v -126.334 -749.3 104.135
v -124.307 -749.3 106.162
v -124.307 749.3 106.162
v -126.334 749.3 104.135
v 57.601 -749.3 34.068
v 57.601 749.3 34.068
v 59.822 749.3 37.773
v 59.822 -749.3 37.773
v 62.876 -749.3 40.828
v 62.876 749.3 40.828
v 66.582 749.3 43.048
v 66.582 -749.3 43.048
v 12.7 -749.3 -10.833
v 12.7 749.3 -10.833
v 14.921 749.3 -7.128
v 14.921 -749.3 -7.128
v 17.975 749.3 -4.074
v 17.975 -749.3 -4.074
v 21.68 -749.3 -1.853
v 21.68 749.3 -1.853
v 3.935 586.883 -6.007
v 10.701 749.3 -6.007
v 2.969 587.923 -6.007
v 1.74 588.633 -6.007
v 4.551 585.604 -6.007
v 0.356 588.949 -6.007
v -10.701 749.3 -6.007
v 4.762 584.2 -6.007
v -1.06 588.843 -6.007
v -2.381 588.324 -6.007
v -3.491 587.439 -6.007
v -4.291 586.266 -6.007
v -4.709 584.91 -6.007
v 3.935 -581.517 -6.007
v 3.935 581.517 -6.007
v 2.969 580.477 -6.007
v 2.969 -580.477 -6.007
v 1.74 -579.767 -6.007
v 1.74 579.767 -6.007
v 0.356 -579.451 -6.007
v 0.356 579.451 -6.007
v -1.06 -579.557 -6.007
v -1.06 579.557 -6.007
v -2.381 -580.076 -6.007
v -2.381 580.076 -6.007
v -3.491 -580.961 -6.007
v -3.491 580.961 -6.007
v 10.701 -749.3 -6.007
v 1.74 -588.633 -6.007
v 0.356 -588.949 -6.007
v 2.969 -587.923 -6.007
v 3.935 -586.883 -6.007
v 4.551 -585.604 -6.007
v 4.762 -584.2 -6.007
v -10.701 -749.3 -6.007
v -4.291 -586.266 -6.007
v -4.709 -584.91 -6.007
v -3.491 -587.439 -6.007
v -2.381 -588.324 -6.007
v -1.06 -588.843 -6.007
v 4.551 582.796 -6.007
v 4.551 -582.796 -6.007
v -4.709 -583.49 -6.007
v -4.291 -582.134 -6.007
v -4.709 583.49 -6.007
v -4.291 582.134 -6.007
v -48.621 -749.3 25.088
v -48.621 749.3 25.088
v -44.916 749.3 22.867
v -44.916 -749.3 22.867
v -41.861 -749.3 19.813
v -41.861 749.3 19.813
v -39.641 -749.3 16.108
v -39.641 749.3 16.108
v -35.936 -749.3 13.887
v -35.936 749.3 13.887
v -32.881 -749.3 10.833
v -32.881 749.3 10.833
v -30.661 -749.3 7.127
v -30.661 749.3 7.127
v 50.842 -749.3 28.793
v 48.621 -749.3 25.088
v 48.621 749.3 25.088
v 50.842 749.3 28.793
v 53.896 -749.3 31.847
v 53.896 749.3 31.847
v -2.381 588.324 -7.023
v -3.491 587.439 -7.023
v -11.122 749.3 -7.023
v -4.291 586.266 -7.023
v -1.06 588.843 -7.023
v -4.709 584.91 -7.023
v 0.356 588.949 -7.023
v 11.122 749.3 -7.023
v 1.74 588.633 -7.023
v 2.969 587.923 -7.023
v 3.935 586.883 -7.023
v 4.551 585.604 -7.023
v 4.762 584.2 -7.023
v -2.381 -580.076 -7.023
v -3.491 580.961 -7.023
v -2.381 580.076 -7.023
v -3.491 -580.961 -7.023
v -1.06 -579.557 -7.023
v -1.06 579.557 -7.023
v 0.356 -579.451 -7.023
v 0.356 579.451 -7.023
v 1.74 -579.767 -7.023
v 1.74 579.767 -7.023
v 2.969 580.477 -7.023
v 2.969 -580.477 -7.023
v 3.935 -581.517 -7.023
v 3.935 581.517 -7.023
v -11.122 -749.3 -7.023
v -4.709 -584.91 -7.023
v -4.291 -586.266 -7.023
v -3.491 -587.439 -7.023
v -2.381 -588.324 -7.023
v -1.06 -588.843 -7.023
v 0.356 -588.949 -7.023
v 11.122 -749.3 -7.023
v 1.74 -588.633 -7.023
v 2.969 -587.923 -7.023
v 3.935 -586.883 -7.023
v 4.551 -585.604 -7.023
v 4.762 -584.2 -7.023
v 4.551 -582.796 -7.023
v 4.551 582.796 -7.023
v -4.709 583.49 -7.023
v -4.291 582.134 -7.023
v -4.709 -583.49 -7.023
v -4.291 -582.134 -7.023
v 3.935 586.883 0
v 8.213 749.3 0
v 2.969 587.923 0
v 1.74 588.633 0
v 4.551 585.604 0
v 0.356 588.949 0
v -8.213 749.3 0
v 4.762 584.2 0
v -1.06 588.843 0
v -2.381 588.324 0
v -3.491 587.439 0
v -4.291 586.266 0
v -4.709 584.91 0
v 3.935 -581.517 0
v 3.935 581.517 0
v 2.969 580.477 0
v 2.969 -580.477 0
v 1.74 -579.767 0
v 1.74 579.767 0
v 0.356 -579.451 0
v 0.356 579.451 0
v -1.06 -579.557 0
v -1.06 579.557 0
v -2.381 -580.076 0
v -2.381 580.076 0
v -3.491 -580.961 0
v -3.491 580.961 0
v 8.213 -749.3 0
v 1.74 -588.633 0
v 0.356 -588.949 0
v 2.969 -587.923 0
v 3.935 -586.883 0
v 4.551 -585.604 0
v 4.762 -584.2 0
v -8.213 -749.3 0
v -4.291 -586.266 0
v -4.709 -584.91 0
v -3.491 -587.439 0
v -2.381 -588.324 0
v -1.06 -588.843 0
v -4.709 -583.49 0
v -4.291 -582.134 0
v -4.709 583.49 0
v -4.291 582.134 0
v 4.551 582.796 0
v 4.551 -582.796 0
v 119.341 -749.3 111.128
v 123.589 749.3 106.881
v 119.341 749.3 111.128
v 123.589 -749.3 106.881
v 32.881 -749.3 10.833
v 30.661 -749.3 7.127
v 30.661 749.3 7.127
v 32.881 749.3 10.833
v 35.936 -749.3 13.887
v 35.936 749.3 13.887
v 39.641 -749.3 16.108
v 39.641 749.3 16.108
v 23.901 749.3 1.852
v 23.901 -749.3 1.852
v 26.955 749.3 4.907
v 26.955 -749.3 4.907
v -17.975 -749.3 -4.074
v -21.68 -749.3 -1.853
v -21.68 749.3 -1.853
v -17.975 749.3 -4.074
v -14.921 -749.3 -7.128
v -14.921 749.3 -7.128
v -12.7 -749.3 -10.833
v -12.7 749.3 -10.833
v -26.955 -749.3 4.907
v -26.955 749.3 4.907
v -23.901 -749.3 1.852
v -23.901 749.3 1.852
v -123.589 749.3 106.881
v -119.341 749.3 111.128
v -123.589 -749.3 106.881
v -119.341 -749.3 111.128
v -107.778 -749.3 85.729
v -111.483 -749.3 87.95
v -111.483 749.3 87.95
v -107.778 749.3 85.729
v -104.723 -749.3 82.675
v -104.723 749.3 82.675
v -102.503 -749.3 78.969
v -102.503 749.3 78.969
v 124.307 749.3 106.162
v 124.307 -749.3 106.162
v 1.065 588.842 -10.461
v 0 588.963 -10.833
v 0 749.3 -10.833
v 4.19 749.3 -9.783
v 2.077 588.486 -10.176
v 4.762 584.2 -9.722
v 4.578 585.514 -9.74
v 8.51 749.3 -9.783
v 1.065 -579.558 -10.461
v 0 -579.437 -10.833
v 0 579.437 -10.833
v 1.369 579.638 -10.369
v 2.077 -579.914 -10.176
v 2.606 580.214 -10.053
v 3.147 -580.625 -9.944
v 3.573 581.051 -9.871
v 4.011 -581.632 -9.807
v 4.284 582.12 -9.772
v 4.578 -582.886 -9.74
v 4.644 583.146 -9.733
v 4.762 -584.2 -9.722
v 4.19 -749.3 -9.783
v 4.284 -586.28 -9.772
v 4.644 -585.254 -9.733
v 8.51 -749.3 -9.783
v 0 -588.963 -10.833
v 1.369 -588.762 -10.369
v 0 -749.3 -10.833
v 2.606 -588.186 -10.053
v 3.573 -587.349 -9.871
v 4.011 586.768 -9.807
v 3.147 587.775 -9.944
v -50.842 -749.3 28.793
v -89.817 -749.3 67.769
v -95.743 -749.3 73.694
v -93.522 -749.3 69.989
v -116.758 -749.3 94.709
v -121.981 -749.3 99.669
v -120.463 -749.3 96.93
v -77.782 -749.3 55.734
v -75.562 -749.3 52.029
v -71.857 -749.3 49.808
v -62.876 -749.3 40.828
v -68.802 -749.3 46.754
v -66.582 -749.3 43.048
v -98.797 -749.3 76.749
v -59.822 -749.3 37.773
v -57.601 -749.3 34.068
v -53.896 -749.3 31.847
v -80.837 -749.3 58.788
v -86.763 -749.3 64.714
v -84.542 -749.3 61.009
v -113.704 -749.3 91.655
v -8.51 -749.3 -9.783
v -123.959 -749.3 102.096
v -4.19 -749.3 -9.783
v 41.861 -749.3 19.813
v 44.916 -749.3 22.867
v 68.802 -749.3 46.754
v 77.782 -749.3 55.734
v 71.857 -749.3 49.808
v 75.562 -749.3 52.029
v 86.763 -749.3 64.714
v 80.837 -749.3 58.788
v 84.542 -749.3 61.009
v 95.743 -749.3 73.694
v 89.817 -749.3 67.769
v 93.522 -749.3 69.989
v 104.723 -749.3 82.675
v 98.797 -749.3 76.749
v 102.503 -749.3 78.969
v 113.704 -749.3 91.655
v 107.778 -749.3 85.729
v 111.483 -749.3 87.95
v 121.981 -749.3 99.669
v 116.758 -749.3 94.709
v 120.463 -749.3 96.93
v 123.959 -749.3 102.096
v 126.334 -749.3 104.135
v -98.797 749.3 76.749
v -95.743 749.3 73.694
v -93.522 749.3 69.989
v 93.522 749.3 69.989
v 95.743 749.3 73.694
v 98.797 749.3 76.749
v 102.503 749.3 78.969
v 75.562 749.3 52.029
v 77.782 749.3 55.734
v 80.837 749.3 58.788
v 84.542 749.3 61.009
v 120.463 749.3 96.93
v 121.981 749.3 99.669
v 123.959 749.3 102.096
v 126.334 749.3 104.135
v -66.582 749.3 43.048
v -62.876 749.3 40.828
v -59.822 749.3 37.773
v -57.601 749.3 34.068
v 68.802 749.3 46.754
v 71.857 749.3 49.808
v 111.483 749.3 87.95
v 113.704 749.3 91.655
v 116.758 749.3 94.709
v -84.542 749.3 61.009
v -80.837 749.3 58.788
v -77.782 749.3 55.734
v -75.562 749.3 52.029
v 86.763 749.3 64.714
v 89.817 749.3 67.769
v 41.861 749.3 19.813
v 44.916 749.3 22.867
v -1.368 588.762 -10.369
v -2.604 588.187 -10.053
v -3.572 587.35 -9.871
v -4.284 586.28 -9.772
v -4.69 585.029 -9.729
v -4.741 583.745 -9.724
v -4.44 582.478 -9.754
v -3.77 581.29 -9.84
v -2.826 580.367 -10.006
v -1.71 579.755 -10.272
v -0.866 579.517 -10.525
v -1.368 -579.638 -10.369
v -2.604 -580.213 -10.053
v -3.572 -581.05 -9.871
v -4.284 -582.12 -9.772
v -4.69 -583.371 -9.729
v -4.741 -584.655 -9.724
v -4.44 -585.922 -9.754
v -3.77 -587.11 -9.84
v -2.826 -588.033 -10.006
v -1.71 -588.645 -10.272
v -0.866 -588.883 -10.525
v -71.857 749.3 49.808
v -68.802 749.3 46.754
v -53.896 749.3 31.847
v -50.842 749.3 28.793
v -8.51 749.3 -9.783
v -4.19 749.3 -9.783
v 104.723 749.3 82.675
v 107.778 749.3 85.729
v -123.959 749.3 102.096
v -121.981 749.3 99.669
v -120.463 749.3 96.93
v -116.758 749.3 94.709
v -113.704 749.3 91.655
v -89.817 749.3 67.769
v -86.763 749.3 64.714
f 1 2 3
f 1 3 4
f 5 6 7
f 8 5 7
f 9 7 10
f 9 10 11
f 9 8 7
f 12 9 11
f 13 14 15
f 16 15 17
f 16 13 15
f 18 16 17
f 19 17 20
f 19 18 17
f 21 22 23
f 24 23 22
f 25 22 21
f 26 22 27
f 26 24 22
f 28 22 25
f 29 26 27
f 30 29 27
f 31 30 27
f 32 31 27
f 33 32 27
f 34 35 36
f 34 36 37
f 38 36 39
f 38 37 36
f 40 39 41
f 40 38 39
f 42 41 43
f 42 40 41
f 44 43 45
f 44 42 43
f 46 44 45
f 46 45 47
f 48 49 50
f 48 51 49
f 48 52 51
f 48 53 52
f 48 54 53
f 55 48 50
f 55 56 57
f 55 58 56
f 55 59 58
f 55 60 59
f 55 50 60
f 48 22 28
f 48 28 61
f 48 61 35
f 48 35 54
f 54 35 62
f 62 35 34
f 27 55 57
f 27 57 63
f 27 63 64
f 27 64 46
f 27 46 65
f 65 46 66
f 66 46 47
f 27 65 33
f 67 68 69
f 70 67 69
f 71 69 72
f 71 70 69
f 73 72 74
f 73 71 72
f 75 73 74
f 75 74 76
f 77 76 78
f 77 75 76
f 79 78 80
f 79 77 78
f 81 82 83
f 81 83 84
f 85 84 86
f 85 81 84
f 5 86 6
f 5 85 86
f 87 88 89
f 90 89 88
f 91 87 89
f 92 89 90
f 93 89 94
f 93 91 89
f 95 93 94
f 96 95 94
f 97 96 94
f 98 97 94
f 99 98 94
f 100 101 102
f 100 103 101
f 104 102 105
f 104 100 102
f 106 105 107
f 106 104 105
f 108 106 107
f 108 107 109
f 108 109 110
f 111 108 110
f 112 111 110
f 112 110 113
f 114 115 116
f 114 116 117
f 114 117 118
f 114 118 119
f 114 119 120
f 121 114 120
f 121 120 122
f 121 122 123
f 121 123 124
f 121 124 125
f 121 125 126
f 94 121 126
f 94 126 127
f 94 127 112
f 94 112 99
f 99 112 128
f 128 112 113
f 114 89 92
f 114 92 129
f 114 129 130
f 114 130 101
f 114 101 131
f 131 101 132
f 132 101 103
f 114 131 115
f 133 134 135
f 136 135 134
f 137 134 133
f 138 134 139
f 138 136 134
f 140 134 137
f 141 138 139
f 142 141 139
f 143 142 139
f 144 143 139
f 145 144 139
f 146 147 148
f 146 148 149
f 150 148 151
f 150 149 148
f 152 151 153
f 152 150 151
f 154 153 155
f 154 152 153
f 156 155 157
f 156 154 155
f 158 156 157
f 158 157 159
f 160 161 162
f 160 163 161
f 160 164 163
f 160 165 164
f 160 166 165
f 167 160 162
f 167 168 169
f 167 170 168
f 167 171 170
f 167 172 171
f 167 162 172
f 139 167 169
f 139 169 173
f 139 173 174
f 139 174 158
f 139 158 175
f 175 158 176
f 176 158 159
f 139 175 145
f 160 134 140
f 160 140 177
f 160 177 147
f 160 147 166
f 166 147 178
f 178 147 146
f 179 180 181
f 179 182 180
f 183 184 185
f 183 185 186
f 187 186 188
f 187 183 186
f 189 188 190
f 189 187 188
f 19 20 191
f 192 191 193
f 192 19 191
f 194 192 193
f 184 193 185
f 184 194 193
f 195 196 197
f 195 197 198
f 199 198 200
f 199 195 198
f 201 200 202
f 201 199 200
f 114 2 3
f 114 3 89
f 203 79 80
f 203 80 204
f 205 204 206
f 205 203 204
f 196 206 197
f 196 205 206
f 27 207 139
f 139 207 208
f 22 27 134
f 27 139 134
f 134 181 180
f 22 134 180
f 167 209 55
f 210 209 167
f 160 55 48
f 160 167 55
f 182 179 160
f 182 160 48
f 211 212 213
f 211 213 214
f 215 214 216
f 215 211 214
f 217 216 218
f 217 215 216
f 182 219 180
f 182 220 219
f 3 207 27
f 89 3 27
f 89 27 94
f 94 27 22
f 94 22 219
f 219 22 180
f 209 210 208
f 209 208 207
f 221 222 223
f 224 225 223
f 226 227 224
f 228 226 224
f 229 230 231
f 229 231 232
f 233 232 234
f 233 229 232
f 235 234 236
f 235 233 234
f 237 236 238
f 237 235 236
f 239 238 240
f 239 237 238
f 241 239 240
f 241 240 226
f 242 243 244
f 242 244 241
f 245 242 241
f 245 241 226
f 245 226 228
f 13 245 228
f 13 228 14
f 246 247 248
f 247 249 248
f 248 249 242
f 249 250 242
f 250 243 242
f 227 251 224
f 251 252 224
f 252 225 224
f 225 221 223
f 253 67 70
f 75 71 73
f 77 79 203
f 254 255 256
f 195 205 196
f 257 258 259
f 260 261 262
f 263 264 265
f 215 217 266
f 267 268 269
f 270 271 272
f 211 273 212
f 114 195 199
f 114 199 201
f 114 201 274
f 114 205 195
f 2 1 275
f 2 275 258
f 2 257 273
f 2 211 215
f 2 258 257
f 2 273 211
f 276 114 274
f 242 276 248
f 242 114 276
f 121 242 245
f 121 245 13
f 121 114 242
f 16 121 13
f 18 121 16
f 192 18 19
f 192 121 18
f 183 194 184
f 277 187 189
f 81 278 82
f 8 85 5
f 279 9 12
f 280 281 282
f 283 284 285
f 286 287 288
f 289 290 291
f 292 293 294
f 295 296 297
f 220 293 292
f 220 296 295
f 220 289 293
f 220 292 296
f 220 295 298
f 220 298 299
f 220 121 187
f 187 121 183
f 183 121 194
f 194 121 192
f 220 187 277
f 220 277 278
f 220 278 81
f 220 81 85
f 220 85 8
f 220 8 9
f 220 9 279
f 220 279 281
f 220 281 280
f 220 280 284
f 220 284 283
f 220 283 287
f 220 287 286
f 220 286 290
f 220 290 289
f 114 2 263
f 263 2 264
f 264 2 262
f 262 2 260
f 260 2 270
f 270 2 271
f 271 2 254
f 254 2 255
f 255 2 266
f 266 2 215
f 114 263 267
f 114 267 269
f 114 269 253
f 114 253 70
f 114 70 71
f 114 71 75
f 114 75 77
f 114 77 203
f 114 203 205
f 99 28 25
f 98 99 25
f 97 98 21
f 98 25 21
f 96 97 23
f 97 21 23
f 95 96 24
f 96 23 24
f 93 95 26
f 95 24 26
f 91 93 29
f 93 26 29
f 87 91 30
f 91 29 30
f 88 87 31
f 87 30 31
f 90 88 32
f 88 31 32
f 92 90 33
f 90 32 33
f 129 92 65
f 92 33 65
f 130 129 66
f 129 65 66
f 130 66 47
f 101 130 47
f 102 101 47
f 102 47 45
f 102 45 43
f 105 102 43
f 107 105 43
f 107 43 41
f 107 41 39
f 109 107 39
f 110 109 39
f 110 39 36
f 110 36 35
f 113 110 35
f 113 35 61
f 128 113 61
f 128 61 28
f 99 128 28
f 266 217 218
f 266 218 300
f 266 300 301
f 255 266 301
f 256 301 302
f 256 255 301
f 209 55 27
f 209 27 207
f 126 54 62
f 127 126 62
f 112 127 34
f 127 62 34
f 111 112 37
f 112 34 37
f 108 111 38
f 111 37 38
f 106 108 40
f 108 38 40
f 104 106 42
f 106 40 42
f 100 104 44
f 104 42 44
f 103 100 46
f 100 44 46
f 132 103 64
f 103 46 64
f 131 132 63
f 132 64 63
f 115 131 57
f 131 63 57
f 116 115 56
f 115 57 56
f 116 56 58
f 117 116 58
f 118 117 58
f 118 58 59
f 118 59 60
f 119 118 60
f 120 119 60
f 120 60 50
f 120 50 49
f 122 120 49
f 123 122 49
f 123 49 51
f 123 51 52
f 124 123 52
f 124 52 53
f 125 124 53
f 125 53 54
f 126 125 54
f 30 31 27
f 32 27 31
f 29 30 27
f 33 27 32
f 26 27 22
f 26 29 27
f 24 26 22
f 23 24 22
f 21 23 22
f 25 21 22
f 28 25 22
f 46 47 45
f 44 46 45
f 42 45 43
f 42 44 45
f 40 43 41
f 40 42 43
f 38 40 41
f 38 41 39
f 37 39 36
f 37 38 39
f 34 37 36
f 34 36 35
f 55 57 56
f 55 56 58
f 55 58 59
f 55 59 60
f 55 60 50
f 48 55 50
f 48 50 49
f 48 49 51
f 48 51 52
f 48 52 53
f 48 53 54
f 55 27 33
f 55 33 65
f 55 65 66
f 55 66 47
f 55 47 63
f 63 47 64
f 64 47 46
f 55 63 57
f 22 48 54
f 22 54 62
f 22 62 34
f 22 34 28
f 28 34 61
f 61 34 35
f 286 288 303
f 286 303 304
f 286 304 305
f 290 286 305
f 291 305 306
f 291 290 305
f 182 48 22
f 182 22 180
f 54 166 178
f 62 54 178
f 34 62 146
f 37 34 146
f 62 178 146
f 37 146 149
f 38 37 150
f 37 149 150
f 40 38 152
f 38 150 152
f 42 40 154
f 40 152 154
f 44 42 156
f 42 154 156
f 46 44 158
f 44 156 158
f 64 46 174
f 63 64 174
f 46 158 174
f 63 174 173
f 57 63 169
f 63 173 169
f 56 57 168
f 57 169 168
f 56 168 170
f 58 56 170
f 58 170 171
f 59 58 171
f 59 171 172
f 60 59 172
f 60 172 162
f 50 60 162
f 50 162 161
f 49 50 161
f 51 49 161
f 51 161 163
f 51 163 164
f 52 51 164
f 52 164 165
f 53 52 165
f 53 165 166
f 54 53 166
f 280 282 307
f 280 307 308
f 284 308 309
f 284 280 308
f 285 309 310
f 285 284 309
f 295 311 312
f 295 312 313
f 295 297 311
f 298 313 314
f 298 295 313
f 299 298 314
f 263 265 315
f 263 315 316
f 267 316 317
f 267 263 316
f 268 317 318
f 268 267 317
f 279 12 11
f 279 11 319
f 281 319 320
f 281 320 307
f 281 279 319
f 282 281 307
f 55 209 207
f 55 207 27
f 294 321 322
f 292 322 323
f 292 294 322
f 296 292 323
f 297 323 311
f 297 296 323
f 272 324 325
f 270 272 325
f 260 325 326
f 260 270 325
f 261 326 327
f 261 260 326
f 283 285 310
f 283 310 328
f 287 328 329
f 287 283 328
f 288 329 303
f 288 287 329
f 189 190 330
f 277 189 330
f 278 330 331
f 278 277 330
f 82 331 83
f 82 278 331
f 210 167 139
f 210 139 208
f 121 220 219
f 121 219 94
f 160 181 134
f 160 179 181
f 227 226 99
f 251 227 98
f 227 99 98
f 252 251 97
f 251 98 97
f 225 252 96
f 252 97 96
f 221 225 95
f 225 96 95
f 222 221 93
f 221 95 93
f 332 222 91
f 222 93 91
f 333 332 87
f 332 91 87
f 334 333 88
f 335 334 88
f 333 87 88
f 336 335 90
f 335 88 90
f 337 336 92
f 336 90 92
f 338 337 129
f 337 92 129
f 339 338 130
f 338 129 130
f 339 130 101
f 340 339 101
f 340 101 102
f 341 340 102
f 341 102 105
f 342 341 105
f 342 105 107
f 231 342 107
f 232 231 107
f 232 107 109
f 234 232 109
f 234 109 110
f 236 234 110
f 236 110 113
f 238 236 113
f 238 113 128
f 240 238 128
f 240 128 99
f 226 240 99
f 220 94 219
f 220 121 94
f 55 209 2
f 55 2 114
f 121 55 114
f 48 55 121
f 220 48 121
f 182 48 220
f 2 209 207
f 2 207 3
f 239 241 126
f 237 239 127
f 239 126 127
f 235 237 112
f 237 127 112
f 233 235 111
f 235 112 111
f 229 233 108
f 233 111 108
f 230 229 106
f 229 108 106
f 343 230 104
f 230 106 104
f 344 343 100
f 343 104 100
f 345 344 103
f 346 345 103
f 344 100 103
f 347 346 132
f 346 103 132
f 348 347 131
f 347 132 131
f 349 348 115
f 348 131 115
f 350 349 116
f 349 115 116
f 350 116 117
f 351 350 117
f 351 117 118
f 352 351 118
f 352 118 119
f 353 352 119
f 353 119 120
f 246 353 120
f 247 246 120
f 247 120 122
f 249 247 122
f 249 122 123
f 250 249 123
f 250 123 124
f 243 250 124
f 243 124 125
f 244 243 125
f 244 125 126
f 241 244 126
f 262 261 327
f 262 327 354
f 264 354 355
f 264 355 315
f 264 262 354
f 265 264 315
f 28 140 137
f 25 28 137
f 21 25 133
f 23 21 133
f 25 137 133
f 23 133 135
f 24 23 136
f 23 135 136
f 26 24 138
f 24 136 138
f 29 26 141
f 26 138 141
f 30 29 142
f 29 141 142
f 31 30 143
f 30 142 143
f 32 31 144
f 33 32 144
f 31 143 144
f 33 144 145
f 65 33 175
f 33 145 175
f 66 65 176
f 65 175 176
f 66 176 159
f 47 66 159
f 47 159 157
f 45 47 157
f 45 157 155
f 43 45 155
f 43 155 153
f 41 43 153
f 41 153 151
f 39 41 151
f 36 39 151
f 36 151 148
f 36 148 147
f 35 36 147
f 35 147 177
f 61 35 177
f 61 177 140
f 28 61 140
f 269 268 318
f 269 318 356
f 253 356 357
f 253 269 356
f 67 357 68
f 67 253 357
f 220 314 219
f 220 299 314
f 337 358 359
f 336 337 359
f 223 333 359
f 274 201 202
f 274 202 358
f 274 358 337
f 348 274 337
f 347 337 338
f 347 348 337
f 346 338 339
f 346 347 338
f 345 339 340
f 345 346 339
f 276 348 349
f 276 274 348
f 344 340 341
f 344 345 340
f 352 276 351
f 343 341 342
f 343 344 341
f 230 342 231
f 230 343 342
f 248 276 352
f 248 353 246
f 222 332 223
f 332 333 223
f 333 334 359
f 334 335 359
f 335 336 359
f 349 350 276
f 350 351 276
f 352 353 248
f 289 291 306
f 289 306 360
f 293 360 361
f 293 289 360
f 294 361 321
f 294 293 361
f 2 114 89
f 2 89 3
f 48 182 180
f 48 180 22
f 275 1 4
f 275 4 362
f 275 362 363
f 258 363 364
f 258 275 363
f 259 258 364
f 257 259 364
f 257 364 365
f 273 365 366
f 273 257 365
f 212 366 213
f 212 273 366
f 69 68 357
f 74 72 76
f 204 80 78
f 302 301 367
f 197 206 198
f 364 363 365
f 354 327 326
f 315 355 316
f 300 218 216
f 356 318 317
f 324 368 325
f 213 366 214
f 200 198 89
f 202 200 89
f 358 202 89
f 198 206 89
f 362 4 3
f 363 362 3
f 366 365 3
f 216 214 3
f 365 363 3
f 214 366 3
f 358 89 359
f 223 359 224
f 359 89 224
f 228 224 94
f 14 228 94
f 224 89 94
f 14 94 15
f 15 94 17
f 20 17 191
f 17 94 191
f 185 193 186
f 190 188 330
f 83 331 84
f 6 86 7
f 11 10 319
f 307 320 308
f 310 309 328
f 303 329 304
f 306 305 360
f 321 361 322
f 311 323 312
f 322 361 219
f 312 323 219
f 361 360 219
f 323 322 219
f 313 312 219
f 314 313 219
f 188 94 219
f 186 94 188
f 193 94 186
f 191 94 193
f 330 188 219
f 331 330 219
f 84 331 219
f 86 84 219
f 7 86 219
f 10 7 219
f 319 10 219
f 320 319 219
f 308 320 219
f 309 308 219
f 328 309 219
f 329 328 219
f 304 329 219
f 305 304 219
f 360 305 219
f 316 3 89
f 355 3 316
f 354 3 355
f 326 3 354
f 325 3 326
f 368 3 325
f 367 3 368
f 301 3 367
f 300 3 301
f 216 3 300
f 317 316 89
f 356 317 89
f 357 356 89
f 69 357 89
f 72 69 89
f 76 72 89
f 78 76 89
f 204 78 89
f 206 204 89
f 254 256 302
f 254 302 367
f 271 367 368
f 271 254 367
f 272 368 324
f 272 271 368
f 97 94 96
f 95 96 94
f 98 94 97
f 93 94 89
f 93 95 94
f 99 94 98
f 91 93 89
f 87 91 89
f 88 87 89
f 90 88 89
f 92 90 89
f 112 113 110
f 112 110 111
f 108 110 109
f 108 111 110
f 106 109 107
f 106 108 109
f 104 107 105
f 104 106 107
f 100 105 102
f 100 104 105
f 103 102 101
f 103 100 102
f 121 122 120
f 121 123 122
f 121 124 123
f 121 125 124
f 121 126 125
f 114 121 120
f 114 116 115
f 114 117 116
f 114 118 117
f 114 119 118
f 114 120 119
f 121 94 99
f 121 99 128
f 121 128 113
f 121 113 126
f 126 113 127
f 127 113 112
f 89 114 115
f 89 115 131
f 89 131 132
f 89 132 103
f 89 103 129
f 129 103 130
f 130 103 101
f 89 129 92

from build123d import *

# Parameters (mm, degrees)
F1_DEPTH = 749.3
F2_DEPTH = 749.3
F3_DEPTH = 749.3
F4_R     = 4.7625
F5_DEPTH = 10.8341


with BuildPart() as f1:
    # F0 (on Front) → F1 (new body, symmetric)
    with BuildSketch(Plane.XZ):
        Polygon((8.2127830575, 0), (0, 0), (-8.2127830575, 0), (-119.3411055301, 111.1283224727), (-123.5887666754, 106.8806613274), (-10.701005348, -6.0071), (0, -6.0071), (10.701005348, -6.0071), (123.5887666754, 106.8806613274), (119.3411055301, 111.1283224727), align=None)
    extrude(amount=F1_DEPTH, both=True)


with BuildPart() as f2:
    # F0 (on Front) → F2 (new body, symmetric)
    with BuildSketch(Plane.XZ):
        Polygon((124.3071871651, 106.1622408377), (123.5887666754, 106.8806613274), (10.701005348, -6.0071), (0, -6.0071), (-10.701005348, -6.0071), (-123.5887666754, 106.8806613274), (-124.3071871651, 106.1622408377), (-11.1218463274, -7.0231), (0, -7.0231), (11.1218463274, -7.0231), align=None)
    extrude(amount=F2_DEPTH, both=True)


with BuildPart() as f3:
    # F0 (on Front) → F3 (new body, symmetric)
    with BuildSketch(Plane.XZ):
        with BuildLine():
            Line((126.3344906062, 104.1349373966), (124.3071871651, 106.1622408377))
            Line((124.3071871651, 106.1622408377), (11.1218463274, -7.0231))
            Line((11.1218463274, -7.0231), (0, -7.0231))
            Line((0, -7.0231), (-11.1218463274, -7.0231))
            Line((-11.1218463274, -7.0231), (-124.3071871651, 106.1622408377))
            Line((-124.3071871651, 106.1622408377), (-126.3344906062, 104.1349373966))
            ThreePointArc((-126.3344906062, 104.1349373966), (-122.9158165988, 100.9260301236), (-120.4630734528, 96.9299734528))
            ThreePointArc((-120.4630734528, 96.9299734528), (-115.136915248, 93.2758755366), (-111.4828173318, 87.9497173318))
            ThreePointArc((-111.4828173318, 87.9497173318), (-106.1566591269, 84.2956194155), (-102.5025612107, 78.9694612107))
            ThreePointArc((-102.5025612107, 78.9694612107), (-97.1764030059, 75.3153632944), (-93.5223050896, 69.9892050896))
            ThreePointArc((-93.5223050896, 69.9892050896), (-88.1961468848, 66.3351071734), (-84.5420489686, 61.0089489686))
            ThreePointArc((-84.5420489686, 61.0089489686), (-79.2158907637, 57.3548510523), (-75.5617928475, 52.0286928475))
            ThreePointArc((-75.5617928475, 52.0286928475), (-70.2356346427, 48.3745949312), (-66.5815367264, 43.0484367264))
            ThreePointArc((-66.5815367264, 43.0484367264), (-61.2553785216, 39.3943388102), (-57.6012806053, 34.0681806053))
            ThreePointArc((-57.6012806053, 34.0681806053), (-52.2751224005, 30.4140826891), (-48.6210244843, 25.0879244843))
            ThreePointArc((-48.6210244843, 25.0879244843), (-43.2948662795, 21.433826568), (-39.6407683632, 16.1076683632))
            ThreePointArc((-39.6407683632, 16.1076683632), (-34.3146101584, 12.453570447), (-30.6605122421, 7.1274122421))
            ThreePointArc((-30.6605122421, 7.1274122421), (-25.3343540373, 3.4733143259), (-21.6802561211, -1.8528438789))
            ThreePointArc((-21.6802561211, -1.8528438789), (-16.3540979162, -5.5069417952), (-12.7, -10.8331))
            ThreePointArc((-12.7, -10.8331), (-6.35, -9.6507748314), (0, -10.8331))
            ThreePointArc((0, -10.8331), (6.35, -9.6507748314), (12.7, -10.8331))
            ThreePointArc((12.7, -10.8331), (16.3540979162, -5.5069417952), (21.6802561211, -1.8528438789))
            ThreePointArc((21.6802561211, -1.8528438789), (25.3343540373, 3.4733143259), (30.6605122421, 7.1274122421))
            ThreePointArc((30.6605122421, 7.1274122421), (34.3146101584, 12.453570447), (39.6407683632, 16.1076683632))
            ThreePointArc((39.6407683632, 16.1076683632), (43.2948662795, 21.433826568), (48.6210244843, 25.0879244843))
            ThreePointArc((48.6210244843, 25.0879244843), (52.2751224005, 30.4140826891), (57.6012806053, 34.0681806053))
            ThreePointArc((57.6012806053, 34.0681806053), (61.2553785216, 39.3943388102), (66.5815367264, 43.0484367264))
            ThreePointArc((66.5815367264, 43.0484367264), (70.2356346427, 48.3745949312), (75.5617928475, 52.0286928475))
            ThreePointArc((75.5617928475, 52.0286928475), (79.2158907637, 57.3548510523), (84.5420489686, 61.0089489686))
            ThreePointArc((84.5420489686, 61.0089489686), (88.1961468848, 66.3351071734), (93.5223050896, 69.9892050896))
            ThreePointArc((93.5223050896, 69.9892050896), (97.1764030059, 75.3153632944), (102.5025612107, 78.9694612107))
            ThreePointArc((102.5025612107, 78.9694612107), (106.1566591269, 84.2956194155), (111.4828173318, 87.9497173318))
            ThreePointArc((111.4828173318, 87.9497173318), (115.136915248, 93.2758755366), (120.4630734528, 96.9299734528))
            ThreePointArc((120.4630734528, 96.9299734528), (122.9158165988, 100.9260301236), (126.3344906062, 104.1349373966))
        make_face()
    extrude(amount=F3_DEPTH, both=True)


with BuildPart() as f5_tool:
    # F4 (on Top) → F5 (new body, through all)
    with BuildSketch(Plane.XY):
        with Locations((0, 584.2)):
            Circle(F4_R)
        with Locations((0, -584.2)):
            Circle(F4_R)
    extrude(amount=-F5_DEPTH)


with BuildPart() as f1_1:
    add(f1.part)

    # F5: cut by f5_tool
    add(f5_tool.part, mode=Mode.SUBTRACT)


with BuildPart() as f2_1:
    add(f2.part)

    # F5: cut by f5_tool
    add(f5_tool.part, mode=Mode.SUBTRACT)


with BuildPart() as f3_1:
    add(f3.part)

    # F5: cut by f5_tool
    add(f5_tool.part, mode=Mode.SUBTRACT)


solid = Compound([f1_1.part, f2_1.part, f3_1.part])
